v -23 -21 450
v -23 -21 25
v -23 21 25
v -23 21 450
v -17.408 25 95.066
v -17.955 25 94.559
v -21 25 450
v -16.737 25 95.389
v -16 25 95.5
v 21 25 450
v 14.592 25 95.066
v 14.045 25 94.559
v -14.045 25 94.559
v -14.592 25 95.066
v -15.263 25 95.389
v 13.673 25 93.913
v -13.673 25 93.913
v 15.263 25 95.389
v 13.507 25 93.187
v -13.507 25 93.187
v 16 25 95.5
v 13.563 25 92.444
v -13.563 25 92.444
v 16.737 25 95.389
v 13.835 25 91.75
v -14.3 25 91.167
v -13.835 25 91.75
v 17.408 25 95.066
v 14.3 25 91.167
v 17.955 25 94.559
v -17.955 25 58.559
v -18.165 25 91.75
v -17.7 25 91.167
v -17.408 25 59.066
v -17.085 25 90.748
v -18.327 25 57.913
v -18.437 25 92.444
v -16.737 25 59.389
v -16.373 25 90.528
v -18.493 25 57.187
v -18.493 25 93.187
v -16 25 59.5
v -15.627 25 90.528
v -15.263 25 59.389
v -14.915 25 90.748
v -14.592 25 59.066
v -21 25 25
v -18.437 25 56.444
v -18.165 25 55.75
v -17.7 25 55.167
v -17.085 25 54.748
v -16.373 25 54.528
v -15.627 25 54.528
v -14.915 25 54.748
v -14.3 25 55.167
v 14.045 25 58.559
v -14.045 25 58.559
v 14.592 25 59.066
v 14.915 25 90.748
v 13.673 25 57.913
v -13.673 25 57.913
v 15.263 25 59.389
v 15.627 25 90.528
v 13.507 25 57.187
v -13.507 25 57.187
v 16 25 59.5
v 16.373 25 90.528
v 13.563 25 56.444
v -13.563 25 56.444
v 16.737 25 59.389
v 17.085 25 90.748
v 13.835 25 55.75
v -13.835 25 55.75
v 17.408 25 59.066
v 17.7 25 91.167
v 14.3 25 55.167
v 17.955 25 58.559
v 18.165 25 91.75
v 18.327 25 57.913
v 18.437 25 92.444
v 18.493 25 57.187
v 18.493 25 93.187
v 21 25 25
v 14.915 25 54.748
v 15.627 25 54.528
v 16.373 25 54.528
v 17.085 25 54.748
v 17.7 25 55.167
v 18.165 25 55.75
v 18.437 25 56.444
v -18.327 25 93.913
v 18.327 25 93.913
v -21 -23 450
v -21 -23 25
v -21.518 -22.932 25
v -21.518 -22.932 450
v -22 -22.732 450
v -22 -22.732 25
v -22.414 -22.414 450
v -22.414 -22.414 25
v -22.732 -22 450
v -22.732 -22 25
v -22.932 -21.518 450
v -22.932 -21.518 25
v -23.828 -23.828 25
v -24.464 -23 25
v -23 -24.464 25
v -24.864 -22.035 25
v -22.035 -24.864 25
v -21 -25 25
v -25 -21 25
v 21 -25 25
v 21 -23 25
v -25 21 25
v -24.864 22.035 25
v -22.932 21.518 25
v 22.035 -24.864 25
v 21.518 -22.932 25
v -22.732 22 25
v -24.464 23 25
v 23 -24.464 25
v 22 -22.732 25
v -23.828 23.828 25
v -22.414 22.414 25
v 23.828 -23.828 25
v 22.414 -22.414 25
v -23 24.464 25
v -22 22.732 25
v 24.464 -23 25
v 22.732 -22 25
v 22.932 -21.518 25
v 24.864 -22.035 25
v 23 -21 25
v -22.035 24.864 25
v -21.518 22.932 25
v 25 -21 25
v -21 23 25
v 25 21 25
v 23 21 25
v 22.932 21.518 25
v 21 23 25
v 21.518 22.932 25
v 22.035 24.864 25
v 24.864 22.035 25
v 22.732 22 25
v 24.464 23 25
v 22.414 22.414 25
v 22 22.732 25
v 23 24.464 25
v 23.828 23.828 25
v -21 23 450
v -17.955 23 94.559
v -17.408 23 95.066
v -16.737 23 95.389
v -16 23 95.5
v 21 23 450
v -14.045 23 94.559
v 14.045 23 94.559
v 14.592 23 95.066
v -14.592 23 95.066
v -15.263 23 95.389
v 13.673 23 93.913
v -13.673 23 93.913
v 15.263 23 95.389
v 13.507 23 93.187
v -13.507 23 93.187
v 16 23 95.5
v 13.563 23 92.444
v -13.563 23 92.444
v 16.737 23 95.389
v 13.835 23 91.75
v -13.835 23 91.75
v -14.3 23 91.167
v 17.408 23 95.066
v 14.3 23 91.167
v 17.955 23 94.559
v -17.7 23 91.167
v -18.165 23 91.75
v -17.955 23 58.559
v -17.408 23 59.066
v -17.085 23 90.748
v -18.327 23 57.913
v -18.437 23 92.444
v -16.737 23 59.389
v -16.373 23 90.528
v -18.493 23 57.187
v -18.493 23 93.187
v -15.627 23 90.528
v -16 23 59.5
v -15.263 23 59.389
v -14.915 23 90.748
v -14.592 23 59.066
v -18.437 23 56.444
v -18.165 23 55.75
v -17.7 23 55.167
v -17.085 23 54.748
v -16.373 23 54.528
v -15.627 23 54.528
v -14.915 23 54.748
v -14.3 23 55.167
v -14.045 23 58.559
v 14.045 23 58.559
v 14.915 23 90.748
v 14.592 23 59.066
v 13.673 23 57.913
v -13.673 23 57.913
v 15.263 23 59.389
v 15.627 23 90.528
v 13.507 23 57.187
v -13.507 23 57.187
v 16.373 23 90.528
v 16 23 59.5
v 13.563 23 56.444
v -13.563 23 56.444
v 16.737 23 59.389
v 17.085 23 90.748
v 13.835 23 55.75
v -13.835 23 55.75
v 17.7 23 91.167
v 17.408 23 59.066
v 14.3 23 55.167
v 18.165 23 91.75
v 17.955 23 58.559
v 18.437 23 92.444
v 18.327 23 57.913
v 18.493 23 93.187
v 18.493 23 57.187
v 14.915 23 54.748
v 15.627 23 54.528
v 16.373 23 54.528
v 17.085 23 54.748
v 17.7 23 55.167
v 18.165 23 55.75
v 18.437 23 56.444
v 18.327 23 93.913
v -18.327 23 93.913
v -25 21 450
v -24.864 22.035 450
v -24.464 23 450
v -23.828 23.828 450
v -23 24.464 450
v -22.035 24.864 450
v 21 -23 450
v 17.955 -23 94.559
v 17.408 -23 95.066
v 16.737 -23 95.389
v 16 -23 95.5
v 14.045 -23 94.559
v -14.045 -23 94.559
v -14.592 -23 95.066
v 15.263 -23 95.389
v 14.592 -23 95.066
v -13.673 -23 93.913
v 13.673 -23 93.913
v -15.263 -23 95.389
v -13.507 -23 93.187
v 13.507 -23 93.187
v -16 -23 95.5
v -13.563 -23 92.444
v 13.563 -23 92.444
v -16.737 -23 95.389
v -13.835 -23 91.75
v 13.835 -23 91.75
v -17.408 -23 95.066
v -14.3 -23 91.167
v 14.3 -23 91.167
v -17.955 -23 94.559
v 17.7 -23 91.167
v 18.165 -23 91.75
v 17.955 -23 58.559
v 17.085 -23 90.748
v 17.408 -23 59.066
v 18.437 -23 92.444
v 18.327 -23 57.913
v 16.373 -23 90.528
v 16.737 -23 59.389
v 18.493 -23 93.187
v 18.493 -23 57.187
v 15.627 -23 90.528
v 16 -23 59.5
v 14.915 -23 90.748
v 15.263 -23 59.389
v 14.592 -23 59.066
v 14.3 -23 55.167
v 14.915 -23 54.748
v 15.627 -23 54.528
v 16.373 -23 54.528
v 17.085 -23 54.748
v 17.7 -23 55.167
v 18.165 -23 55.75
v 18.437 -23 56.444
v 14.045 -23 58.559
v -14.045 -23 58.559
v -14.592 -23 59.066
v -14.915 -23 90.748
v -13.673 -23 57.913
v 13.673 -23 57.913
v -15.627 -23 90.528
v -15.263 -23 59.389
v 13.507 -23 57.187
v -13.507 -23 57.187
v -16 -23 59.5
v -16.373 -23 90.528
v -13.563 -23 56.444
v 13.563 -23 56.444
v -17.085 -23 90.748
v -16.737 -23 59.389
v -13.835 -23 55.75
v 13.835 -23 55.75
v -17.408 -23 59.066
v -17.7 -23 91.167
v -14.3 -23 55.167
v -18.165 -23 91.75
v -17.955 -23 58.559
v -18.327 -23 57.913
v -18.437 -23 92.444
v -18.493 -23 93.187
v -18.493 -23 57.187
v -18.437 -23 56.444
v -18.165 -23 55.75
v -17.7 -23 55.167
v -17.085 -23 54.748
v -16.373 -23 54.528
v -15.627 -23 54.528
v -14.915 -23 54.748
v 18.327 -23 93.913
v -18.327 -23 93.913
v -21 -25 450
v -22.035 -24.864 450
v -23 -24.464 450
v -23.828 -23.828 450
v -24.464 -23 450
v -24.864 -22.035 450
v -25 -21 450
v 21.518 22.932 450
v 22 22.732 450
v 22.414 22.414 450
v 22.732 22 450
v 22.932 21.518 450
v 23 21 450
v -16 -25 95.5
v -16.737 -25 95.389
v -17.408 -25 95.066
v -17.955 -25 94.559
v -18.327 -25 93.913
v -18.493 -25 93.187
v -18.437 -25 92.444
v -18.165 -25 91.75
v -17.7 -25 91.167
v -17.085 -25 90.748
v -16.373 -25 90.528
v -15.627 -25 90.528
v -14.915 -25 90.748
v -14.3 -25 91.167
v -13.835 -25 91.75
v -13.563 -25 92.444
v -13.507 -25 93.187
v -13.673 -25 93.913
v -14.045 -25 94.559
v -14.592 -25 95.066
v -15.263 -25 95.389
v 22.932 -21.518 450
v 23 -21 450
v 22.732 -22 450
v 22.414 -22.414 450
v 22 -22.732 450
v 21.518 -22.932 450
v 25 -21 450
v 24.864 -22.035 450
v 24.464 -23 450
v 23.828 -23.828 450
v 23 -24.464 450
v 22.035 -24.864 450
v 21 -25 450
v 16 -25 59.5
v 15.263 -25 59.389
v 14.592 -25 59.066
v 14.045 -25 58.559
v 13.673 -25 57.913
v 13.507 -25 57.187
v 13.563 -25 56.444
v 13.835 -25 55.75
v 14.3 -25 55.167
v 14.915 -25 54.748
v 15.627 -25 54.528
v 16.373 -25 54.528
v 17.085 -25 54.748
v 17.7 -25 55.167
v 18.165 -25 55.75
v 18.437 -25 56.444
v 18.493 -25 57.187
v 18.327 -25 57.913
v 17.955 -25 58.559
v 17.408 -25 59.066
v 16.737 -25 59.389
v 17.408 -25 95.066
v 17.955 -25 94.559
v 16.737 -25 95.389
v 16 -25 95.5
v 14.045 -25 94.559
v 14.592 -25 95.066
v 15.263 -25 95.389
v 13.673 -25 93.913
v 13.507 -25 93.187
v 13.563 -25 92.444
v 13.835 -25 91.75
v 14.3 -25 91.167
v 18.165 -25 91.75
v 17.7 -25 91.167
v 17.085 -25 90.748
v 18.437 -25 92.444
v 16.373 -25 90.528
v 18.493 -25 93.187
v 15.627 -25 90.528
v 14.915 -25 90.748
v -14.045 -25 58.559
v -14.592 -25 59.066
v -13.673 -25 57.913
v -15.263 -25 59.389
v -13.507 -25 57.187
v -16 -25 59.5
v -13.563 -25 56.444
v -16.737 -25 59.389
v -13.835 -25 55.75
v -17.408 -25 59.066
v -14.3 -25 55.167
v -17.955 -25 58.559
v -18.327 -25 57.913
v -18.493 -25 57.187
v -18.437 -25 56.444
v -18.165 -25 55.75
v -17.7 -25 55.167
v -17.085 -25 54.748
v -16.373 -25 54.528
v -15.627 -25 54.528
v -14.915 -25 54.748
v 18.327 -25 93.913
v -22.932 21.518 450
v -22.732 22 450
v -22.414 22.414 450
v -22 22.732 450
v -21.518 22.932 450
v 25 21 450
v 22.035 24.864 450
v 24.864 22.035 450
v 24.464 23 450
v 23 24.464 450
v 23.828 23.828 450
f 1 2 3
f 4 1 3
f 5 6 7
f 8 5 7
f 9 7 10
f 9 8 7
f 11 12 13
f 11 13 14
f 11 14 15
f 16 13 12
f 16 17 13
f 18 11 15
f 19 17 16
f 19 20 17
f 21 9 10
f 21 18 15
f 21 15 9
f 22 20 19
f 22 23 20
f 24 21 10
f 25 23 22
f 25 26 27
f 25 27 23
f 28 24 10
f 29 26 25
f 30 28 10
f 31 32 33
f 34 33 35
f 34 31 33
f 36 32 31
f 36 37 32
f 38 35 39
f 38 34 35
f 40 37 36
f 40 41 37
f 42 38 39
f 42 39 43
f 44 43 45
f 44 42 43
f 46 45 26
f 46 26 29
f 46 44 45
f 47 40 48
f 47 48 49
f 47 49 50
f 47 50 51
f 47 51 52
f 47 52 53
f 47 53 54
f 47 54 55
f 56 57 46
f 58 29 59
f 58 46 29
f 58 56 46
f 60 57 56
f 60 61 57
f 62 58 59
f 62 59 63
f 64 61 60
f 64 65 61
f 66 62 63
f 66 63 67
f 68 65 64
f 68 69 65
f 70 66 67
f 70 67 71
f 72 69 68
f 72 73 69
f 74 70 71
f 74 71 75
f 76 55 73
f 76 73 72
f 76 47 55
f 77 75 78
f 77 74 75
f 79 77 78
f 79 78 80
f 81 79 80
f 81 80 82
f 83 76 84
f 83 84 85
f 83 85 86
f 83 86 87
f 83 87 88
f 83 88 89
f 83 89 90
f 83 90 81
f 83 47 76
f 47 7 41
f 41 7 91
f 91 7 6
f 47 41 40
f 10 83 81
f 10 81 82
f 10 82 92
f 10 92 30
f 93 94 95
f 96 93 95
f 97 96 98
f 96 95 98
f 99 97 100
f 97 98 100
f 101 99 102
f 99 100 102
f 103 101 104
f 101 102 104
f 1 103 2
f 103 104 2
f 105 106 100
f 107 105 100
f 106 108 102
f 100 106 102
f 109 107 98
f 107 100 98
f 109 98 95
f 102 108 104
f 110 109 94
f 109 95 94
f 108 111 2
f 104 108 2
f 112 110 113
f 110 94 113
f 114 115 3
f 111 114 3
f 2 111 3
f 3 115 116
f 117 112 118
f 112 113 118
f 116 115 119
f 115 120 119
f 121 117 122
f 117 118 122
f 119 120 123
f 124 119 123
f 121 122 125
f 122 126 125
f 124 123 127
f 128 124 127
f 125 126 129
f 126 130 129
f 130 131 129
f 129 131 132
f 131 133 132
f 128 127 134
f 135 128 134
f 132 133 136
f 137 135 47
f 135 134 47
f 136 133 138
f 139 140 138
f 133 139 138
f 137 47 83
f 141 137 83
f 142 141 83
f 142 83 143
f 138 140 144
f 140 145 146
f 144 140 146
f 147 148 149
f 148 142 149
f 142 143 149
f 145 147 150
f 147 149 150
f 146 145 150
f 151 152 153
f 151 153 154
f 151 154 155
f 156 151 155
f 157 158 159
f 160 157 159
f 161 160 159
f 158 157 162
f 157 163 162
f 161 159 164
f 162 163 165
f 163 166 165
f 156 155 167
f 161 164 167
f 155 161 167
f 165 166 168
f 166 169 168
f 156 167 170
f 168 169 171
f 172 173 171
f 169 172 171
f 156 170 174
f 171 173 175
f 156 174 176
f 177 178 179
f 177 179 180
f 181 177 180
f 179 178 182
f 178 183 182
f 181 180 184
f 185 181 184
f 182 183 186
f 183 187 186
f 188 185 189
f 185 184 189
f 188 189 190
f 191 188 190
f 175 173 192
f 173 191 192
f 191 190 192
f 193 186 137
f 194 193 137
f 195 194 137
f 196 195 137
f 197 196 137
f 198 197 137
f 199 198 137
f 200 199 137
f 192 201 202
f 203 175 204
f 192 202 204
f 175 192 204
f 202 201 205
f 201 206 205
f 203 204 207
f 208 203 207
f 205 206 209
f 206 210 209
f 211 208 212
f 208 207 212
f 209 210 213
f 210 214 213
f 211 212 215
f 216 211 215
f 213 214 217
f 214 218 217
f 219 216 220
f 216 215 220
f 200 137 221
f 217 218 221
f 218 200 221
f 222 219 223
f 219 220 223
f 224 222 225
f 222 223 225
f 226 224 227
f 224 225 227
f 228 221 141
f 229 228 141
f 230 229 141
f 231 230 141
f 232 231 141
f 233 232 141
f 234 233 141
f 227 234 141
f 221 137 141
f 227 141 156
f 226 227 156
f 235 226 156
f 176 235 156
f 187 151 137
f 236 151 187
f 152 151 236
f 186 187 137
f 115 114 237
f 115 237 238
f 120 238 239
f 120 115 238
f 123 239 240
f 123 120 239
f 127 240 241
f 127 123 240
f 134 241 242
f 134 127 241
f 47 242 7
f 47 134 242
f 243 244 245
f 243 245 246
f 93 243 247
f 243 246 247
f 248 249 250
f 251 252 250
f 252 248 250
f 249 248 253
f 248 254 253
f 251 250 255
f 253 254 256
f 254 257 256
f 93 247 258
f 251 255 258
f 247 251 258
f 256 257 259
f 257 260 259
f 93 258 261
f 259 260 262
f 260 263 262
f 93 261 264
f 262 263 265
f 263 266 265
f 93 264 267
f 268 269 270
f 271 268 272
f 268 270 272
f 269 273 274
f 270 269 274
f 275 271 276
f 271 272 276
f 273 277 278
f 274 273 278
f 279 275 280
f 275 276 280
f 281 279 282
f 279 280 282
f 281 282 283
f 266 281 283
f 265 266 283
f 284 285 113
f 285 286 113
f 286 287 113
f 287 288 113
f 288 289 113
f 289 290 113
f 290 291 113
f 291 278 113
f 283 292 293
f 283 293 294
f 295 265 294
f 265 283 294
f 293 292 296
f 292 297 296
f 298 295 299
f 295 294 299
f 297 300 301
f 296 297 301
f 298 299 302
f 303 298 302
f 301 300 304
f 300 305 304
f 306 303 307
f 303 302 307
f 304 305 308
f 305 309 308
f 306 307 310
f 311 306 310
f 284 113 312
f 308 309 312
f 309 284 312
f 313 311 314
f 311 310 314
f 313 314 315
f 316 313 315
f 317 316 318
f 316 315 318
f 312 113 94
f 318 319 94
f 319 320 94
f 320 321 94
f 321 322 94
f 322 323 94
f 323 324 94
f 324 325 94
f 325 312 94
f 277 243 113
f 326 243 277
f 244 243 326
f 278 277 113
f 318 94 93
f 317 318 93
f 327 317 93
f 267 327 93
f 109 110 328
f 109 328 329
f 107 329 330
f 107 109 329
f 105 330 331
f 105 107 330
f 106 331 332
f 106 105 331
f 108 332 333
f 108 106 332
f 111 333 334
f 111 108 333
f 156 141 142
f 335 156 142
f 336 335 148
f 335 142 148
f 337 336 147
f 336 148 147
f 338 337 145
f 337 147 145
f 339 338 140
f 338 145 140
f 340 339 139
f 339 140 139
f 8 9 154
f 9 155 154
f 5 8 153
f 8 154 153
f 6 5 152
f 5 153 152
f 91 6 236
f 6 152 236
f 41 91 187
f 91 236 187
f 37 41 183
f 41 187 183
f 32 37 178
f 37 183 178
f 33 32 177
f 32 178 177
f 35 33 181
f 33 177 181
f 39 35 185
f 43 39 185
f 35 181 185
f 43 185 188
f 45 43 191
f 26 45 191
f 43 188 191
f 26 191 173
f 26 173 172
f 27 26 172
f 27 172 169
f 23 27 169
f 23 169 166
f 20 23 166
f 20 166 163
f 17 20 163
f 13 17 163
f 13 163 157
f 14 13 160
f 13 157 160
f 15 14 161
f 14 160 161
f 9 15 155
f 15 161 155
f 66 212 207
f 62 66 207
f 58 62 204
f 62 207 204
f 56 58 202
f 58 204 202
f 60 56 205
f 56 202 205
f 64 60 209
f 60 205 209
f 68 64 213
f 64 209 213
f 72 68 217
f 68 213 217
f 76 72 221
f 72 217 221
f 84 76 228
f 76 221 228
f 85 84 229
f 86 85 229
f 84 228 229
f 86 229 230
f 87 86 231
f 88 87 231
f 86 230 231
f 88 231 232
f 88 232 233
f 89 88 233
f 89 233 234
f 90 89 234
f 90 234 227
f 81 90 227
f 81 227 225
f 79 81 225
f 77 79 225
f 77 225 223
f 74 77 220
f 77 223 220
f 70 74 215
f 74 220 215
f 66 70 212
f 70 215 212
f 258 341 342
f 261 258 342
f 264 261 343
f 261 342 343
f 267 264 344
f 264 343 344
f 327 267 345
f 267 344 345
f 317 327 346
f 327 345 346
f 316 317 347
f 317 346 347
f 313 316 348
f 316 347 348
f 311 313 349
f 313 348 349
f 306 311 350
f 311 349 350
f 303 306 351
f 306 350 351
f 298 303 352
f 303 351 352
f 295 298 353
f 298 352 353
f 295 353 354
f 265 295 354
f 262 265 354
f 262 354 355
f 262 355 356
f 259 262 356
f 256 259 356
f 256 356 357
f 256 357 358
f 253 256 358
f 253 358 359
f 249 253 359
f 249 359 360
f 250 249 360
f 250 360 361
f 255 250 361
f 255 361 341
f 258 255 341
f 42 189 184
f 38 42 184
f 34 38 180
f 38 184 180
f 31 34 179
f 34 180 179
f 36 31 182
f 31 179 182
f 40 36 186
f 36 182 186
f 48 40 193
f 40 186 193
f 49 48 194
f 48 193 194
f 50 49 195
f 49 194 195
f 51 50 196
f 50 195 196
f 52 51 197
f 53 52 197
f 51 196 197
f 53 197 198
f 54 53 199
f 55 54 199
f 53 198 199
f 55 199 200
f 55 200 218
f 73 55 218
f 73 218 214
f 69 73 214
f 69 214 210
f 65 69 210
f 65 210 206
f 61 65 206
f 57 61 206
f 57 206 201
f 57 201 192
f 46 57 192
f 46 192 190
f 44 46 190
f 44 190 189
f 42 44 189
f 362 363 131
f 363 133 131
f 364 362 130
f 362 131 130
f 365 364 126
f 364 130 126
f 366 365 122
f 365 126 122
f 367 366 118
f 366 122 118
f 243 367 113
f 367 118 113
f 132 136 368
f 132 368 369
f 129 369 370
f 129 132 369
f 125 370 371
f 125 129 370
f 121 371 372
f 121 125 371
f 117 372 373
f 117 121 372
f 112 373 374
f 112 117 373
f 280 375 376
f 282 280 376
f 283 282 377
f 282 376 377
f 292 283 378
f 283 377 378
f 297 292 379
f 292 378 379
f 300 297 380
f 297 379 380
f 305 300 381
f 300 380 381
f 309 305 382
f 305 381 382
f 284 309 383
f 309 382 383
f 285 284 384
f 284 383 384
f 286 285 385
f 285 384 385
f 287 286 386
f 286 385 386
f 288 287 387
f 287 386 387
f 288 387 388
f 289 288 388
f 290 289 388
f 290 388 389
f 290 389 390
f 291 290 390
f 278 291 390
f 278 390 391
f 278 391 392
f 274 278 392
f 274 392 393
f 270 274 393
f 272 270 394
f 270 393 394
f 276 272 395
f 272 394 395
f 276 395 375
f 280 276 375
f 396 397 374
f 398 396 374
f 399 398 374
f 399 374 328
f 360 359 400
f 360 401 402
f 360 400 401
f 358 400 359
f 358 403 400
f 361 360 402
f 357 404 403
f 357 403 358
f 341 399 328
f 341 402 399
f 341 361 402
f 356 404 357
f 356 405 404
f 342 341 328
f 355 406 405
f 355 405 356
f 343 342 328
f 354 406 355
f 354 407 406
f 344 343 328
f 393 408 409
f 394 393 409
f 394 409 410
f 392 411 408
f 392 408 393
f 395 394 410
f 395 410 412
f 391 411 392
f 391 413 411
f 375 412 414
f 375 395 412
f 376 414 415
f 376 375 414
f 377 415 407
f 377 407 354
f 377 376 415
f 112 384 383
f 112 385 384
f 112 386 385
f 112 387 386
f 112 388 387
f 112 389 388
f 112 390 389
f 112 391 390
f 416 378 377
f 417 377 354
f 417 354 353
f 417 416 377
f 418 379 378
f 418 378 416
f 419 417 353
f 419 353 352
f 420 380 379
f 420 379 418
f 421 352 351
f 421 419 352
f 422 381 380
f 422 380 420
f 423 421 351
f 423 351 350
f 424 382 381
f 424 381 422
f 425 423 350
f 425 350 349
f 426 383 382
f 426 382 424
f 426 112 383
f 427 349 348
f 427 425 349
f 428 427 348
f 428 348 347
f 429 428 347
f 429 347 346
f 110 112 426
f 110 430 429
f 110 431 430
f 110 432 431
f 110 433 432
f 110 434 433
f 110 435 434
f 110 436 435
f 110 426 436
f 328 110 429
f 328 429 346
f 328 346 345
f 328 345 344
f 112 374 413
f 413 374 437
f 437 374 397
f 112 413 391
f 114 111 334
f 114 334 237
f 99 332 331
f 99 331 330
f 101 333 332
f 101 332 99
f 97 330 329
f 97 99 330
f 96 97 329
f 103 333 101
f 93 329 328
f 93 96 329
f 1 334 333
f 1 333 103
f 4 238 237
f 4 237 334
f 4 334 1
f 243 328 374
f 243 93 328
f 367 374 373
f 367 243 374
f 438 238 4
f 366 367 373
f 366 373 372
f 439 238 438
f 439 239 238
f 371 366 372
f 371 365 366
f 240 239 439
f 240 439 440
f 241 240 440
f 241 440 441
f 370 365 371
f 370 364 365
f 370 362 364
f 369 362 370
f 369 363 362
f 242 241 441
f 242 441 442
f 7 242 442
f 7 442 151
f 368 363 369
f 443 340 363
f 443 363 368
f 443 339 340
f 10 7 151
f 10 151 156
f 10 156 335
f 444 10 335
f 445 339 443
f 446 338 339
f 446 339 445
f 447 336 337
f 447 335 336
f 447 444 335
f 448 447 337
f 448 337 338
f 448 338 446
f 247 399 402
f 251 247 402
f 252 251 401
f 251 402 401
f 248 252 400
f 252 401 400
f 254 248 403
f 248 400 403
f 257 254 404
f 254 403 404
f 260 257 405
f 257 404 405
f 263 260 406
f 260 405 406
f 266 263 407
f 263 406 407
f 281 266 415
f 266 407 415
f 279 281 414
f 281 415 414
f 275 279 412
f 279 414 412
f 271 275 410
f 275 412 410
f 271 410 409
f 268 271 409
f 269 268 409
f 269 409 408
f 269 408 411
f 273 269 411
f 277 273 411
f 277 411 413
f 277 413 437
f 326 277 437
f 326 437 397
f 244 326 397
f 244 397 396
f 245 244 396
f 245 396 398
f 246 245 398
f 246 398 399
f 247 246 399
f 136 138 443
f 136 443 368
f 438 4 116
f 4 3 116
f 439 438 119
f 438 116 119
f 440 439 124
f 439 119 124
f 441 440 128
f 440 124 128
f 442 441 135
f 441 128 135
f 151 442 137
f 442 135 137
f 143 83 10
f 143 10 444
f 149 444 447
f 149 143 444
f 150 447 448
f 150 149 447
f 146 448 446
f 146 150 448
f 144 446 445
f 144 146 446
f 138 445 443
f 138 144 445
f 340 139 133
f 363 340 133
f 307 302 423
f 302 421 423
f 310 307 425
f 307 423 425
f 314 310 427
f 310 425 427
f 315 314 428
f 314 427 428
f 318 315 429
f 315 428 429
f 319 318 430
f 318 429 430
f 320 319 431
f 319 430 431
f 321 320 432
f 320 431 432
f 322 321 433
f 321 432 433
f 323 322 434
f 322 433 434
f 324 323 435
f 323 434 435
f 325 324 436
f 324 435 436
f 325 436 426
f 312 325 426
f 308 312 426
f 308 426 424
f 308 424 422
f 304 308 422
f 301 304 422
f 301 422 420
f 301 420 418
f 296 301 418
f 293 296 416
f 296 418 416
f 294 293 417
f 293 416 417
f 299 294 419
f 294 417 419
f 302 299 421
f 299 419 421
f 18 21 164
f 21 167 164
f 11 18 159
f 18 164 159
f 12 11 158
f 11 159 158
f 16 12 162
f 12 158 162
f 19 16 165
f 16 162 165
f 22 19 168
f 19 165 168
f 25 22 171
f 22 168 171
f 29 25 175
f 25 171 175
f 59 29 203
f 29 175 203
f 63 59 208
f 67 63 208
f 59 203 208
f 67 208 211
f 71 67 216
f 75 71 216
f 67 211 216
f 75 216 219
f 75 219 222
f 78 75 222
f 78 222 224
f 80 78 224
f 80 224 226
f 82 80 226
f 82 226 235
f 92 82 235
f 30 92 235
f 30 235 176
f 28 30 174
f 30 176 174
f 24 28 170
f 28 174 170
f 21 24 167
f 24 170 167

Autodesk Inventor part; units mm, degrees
ref_plane "Start Plane" through (0, 0, 25) normal (0, 0, 1) x (1, 0, 0)
ref_plane "End Plane" through (0, 0, 450) normal (0, 0, 1) x (1, 0, 0)
sketch "Sketch" plane through (0, 0, 0) normal (0, 0, 1) x (1, 0, 0)
  line L0 (-25, -21) -> (-25, 21)
  line L1 (-21, 25) -> (21, 25)
  line L2 (25, 21) -> (25, -21)
  line L3 (21, -25) -> (-21, -25)
  arc A0 (-25, -21) -> (-21, -25) centre (-21, -21) ccw
  arc A1 (25, 21) -> (21, 25) centre (21, 21) ccw
  arc A2 (-21, 25) -> (-25, 21) centre (-21, 21) ccw
  arc A3 (21, -25) -> (25, -21) centre (21, -21) ccw
  arc A4 (-21, 23) -> (-23, 21) centre (-21, 21) ccw
  line L4 (-21, 23) -> (21, 23)
  arc A5 (23, 21) -> (21, 23) centre (21, 21) ccw
  line L5 (23, 21) -> (23, -21)
  arc A6 (21, -23) -> (23, -21) centre (21, -21) ccw
  line L6 (21, -23) -> (-21, -23)
  arc A7 (-23, -21) -> (-21, -23) centre (-21, -21) ccw
  line L7 (-23, -21) -> (-23, 21)
  line L8 (0, 36.1598) -> (0, -36.1598) construction
  line L9 (-36.1598, 0) -> (36.1598, 0) construction
  dimension "d7" = 4
  dimension "d9" = 50
  dimension "d11" = 50
  dimension "d12" = 2
  dimension "d15" = 25
  dimension "d16" = 25
extrude "Body" add sketch "Sketch" along normal up to surface (425 mm away) from surface at 25
sketch "Sketch3" plane through (0, 0, 0) normal (0, 0, 1) x (1, 0, 0)
  line L0 (0, 0) -> (10, 0)
ref_plane "Work Plane3" through (0, 0, 0) normal (0, -1, 0) x (1, 0, 0)
sketch "Sketch4" plane through (0, 0, 0) normal (0, -1, 0) x (1, 0, 0)
  line L0 (-2, 25) -> (12, 25)
  line L1 (-2, 450) -> (12, 450)
  dimension "d18" = 425
ref_plane "Work Plane4" through (0, 20, 25) normal (0, 0, -1) x (-1, 0, 0)
split "Split1" plane through (0, 20, 25) removes the side toward (0, 0, -1)
sketch "Sketch5" plane through (21, 25, 450) normal (0, 1, 0) x (1, 0, 0)
  line L0 (-5, 357) -> (-37, 357)
  line L1 (-37, 357) -> (-37, 393)
  line L2 (-37, 393) -> (-5, 393)
  line L3 (-5, 393) -> (-5, 357)
  line L4 (-42, 0) -> (0, 0) projected
  line L5 (0, 425) -> (0, 0) projected
  line L6 (-42, 425) -> (0, 425) projected
  line L7 (-42, 425) -> (-42, 0) projected
  line L8 (0, 425) -> (-42, 425) projected
  line L9 (-21, 425) -> (-21, 412.7282)
  point P0 (-21, 450)
  dimension "d19" = 32
  dimension "d20" = 32
  dimension "d21" = 36
hole "Hole1" at (16, 25, 93) at (16, 25, 57) at (-16, 25, 57) at (-16, 25, 93) direction (0, -1, 0) diameter 5 depth 50
equation "\"d7\" = G_IR"
equation "\"d9\" = G_W"
equation "\"d11\" = G_H"
equation "\"d12\" = G_T"
equation "\"d15\" = 0.5 * d9"
equation "\"d16\" = 0.5 * d11"
equation "\"d3\" = G_L"
equation "\"G_W\" = 50"
equation "\"G_H\" = 50"
equation "\"G_T\" = 2"
equation "\"G_IR\" = 4"
equation "\"G_L\" = d18"
equation "\"G_OFFSET_START\" = -25"
equation "\"G_OFFSET_END\" = 0"
equation "\"d13\" = -G_OFFSET_START"
properties part number "ISO 10799-2 - 50x50x2 - 425" material "Steel, Galvanized"
